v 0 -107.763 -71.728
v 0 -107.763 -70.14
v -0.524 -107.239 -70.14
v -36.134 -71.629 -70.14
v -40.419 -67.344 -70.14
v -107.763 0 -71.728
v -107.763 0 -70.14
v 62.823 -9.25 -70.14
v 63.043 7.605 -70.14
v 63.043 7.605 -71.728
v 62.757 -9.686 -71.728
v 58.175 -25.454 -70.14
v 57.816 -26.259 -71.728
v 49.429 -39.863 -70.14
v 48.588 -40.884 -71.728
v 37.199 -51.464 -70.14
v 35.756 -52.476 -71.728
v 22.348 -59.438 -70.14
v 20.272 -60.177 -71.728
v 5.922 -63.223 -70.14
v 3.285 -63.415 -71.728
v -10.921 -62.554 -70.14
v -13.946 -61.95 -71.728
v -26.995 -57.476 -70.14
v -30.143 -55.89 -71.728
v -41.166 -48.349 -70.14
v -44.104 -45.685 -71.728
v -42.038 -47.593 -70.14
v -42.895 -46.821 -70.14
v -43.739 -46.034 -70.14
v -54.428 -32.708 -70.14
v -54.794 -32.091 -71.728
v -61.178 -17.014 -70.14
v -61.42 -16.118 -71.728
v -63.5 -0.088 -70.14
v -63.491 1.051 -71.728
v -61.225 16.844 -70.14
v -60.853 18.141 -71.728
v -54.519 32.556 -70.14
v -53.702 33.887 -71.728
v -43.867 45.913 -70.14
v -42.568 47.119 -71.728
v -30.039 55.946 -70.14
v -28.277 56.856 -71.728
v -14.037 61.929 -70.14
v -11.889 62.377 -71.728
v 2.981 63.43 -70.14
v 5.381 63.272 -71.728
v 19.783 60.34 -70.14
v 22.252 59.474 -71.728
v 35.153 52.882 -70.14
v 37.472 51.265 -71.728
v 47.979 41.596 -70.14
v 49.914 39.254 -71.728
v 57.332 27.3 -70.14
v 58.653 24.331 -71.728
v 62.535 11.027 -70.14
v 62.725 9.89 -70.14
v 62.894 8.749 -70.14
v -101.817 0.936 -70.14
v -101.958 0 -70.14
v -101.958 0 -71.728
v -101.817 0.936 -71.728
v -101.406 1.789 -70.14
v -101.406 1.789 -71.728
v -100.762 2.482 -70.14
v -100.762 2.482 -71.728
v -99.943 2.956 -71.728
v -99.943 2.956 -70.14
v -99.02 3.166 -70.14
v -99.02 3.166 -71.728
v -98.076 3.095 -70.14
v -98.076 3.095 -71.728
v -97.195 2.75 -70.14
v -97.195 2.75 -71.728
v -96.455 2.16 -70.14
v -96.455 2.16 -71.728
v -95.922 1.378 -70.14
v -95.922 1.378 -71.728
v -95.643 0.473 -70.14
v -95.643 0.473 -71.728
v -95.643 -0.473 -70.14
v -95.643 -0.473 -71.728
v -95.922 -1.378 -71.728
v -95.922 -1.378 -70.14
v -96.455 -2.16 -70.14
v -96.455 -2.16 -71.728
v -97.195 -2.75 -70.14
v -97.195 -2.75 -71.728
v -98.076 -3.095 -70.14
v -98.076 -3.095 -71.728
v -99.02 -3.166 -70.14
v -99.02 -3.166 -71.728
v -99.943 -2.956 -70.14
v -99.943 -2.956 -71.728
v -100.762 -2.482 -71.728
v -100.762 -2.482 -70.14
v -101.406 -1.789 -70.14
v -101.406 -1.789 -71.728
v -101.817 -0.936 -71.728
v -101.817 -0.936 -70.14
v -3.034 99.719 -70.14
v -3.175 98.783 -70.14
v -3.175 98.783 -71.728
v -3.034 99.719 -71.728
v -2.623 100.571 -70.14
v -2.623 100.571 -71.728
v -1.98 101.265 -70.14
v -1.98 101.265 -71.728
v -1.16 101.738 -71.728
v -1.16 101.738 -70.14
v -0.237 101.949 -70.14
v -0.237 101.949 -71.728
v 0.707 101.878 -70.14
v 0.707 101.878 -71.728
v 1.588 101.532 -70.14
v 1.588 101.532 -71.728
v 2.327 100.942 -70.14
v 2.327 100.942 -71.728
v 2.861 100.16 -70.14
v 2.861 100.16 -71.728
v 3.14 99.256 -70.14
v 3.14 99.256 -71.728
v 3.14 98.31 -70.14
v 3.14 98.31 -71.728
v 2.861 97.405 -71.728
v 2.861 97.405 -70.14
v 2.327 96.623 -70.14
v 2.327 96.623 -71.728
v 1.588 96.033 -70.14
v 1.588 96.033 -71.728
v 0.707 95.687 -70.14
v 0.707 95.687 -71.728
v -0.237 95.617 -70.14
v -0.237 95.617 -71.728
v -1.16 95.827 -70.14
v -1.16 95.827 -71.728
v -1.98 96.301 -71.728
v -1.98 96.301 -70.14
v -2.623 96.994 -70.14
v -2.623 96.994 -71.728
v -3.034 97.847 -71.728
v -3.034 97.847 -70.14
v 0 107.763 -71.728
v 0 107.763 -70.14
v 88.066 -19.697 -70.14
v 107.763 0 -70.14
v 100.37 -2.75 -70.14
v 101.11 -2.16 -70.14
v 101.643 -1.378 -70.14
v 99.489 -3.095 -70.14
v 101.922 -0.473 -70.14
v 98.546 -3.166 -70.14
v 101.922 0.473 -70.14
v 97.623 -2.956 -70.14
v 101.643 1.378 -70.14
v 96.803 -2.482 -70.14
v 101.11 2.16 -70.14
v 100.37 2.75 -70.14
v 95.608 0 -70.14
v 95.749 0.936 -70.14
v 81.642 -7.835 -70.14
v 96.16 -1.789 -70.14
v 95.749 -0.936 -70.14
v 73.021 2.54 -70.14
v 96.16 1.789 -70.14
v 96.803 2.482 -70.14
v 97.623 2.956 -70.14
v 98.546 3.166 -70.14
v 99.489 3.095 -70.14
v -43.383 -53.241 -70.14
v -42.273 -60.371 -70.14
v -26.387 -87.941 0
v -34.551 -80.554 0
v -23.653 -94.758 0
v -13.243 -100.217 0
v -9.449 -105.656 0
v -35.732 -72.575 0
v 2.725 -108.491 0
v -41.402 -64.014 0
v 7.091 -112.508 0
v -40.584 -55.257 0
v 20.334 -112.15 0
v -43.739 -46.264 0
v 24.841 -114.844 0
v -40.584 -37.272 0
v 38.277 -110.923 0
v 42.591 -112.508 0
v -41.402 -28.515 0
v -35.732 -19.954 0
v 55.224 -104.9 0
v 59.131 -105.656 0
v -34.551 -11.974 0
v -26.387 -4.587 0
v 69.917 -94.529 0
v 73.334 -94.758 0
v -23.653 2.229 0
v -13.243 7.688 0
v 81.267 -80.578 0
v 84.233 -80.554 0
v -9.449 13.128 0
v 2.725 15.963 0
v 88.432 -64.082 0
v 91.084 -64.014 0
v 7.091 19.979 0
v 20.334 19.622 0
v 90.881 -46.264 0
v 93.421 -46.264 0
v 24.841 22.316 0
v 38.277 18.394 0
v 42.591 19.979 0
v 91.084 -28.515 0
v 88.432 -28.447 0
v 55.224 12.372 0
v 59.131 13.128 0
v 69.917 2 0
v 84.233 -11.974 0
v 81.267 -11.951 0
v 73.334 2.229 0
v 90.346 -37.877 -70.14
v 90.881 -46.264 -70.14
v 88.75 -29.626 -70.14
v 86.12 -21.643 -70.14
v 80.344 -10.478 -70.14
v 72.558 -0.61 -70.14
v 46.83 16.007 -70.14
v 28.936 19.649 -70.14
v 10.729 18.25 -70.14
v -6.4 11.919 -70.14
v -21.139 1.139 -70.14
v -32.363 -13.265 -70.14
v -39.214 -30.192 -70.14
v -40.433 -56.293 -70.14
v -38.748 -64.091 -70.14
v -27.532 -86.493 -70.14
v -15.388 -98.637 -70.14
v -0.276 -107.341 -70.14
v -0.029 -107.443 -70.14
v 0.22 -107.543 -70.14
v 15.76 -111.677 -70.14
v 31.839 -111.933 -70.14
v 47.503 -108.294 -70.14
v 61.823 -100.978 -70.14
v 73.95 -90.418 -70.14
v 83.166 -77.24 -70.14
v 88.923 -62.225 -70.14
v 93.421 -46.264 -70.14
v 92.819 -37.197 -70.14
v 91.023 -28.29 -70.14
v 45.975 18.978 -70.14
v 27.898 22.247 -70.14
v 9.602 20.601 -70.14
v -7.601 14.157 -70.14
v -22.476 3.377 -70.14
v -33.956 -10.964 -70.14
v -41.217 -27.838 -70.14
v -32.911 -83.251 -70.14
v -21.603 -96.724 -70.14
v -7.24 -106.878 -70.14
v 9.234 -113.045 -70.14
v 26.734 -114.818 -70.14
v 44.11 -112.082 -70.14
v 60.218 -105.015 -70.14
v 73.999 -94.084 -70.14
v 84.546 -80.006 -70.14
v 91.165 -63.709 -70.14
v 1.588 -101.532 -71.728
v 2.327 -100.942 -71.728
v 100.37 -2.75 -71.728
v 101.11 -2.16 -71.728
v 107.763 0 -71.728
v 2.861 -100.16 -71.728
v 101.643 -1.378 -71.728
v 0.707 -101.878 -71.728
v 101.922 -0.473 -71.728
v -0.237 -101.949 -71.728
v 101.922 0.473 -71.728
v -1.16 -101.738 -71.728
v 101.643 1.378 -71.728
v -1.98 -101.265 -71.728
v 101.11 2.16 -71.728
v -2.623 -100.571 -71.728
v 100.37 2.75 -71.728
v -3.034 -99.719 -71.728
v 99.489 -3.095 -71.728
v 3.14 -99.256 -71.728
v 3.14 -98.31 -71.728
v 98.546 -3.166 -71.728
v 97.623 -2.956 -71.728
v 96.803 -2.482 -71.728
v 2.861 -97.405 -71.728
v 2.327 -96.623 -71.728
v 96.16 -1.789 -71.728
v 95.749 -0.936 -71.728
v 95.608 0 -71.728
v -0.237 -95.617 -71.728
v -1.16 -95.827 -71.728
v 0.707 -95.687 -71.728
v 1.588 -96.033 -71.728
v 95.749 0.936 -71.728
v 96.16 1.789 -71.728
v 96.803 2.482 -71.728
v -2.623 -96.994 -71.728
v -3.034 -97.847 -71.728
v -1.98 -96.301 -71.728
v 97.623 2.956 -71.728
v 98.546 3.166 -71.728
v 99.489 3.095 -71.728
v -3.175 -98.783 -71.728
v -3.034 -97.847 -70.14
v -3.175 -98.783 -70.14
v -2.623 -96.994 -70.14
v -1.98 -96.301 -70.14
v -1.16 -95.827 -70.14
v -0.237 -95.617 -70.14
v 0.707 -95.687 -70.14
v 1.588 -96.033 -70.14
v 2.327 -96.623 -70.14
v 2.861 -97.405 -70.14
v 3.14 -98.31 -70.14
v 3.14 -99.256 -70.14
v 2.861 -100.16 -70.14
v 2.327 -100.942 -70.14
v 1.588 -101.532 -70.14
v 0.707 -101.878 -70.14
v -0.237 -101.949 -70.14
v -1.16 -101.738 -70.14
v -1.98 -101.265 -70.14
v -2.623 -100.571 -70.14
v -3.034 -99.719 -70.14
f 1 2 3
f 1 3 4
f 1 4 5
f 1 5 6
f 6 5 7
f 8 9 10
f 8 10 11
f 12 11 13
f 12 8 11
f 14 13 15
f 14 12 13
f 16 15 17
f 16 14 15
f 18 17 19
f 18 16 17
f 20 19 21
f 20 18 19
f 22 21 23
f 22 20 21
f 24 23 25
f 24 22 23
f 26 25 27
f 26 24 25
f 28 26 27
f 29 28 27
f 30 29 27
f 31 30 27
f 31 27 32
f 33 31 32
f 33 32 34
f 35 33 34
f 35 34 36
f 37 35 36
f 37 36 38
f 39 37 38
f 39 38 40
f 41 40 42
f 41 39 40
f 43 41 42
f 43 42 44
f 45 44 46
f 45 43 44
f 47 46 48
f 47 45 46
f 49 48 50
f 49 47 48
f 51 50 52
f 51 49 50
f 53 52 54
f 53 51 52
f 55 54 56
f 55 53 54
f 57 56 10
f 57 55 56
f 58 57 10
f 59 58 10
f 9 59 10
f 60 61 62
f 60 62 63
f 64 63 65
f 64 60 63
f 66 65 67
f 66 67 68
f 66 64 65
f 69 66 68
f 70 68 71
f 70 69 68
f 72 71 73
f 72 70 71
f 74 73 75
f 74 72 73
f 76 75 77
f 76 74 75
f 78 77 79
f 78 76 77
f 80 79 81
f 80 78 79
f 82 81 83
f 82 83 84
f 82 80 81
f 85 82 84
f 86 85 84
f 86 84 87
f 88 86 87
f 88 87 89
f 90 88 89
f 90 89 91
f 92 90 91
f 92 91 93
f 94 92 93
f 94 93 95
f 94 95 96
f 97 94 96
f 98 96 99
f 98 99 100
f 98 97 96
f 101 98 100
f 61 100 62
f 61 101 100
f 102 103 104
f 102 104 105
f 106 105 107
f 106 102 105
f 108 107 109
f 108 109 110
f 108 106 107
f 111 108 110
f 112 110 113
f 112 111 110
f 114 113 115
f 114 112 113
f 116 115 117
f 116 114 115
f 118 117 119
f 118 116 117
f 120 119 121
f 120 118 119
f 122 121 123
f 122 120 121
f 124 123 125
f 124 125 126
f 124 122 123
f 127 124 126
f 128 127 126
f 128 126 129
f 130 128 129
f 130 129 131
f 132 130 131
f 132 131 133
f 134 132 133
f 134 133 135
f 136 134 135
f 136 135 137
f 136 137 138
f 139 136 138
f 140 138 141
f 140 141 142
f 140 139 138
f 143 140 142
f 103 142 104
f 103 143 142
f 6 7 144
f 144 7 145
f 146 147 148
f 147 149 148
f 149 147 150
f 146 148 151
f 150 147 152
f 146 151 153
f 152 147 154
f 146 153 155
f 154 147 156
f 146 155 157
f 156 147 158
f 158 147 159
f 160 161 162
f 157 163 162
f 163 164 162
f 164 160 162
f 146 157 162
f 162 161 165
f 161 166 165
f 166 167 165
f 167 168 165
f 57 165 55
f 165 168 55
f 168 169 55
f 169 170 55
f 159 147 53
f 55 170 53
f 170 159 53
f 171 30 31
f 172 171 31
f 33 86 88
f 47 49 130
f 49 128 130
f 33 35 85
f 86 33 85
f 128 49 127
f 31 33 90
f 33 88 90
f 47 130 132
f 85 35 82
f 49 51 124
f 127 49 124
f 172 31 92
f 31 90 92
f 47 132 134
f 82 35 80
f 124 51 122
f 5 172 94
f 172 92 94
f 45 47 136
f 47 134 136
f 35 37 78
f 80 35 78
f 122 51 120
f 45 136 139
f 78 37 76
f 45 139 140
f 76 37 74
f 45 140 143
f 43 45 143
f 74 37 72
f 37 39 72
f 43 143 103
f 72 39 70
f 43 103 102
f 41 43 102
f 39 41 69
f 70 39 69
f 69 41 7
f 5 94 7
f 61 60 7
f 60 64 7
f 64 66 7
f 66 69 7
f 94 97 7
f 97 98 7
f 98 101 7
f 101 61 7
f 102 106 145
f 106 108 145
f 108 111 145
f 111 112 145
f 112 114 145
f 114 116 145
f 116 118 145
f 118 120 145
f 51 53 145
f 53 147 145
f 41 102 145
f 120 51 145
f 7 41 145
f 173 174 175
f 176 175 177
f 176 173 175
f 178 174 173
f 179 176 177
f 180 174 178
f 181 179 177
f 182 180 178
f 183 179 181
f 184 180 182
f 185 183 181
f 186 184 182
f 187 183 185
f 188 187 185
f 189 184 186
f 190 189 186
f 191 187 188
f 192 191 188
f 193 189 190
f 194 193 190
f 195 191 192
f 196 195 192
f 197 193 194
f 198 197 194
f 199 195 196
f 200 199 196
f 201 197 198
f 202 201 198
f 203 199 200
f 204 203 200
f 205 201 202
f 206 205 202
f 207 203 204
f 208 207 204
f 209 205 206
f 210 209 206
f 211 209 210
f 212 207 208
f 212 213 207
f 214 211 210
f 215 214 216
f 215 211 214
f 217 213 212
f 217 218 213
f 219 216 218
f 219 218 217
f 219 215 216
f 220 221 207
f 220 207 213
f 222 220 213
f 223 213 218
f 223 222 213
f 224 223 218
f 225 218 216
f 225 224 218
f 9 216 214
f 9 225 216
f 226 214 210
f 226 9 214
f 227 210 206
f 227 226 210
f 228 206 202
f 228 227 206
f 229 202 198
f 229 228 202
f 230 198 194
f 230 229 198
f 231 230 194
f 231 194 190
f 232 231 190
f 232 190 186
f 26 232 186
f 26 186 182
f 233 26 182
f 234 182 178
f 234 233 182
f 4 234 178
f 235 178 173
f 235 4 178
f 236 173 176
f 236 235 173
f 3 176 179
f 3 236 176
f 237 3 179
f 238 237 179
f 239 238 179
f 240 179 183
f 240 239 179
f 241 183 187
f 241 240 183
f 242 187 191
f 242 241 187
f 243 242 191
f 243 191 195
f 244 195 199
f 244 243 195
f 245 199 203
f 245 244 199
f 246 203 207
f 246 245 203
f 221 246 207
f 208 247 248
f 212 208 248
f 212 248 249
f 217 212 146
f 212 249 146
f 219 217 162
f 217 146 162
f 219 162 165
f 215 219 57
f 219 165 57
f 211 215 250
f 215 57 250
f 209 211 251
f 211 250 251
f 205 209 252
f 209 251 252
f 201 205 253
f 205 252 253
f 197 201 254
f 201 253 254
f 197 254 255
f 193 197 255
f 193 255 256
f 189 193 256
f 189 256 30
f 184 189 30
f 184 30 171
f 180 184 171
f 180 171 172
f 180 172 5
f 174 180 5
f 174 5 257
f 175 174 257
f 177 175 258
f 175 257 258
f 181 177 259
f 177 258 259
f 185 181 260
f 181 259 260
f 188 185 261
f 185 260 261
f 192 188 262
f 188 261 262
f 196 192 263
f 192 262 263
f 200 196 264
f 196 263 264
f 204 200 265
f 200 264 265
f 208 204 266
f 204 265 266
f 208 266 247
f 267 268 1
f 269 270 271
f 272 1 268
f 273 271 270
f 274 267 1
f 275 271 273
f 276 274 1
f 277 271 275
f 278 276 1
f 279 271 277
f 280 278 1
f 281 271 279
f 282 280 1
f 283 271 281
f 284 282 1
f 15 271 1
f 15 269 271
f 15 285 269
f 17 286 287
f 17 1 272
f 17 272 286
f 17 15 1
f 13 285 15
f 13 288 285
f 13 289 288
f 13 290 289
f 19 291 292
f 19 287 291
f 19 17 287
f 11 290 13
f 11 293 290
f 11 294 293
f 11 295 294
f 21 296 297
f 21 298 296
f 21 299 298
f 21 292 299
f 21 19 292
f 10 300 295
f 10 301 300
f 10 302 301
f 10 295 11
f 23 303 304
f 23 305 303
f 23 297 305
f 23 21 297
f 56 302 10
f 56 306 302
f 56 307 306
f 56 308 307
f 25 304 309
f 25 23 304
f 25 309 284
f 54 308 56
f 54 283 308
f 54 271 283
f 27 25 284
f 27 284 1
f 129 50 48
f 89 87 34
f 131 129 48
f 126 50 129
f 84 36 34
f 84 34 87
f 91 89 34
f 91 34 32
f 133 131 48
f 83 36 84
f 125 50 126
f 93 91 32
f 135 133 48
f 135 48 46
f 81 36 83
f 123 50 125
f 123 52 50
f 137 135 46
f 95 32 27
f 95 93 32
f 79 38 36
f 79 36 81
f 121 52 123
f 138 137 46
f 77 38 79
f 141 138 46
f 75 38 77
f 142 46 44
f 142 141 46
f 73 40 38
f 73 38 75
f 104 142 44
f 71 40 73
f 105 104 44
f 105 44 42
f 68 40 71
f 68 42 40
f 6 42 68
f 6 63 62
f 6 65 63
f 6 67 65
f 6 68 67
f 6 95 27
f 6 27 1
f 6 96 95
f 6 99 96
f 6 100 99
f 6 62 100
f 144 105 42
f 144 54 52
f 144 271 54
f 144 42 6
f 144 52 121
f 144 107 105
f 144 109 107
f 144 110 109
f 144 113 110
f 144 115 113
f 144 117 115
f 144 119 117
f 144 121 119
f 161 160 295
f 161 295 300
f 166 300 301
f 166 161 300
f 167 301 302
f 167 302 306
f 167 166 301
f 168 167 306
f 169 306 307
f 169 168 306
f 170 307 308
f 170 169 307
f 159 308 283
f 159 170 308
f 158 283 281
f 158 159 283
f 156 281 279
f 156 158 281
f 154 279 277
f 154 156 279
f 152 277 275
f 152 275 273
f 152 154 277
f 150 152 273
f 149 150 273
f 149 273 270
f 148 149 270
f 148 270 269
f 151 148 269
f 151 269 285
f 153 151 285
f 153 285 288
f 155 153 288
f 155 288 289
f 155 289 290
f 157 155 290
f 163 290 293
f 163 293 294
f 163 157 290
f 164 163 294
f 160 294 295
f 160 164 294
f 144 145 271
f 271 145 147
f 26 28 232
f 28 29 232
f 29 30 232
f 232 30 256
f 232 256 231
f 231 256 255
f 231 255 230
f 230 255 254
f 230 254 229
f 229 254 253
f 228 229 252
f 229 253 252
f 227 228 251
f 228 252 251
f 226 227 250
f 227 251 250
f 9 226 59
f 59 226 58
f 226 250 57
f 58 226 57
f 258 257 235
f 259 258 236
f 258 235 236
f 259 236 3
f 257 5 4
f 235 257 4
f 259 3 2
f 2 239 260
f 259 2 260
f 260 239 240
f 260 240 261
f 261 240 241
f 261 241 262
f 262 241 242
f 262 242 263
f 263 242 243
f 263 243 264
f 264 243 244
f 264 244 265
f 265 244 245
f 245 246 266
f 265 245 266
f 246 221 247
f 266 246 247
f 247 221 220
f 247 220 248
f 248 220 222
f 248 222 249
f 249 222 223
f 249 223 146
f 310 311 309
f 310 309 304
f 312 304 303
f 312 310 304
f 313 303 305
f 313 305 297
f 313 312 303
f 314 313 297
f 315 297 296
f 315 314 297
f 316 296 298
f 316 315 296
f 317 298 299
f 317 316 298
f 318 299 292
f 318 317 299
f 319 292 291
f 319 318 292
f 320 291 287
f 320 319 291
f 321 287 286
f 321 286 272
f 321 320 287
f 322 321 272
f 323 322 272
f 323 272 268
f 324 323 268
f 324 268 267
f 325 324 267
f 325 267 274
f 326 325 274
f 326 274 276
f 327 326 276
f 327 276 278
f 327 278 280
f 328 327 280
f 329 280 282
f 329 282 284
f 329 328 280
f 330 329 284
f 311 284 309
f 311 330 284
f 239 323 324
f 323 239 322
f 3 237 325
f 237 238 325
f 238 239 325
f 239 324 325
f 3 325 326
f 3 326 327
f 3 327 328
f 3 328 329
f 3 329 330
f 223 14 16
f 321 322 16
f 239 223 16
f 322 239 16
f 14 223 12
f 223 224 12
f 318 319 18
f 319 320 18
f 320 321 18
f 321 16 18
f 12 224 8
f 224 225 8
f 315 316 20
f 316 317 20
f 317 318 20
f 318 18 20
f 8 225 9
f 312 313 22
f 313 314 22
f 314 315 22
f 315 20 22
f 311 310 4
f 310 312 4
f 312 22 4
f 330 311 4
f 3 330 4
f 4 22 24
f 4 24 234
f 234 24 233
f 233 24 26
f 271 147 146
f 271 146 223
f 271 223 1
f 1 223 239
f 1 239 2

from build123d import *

# Parameters (mm, degrees)
BOSS_EXTRUDE1_START = -70.140187
SKETCH1_R           = 68.58
SKETCH1_R_2         = 66.04
BOSS_EXTRUDE1_DEPTH = 70.140187
SKETCH2_R           = 3.175
SKETCH2_R_2         = 63.5
BOSS_EXTRUDE2_DEPTH = 1.5875


with BuildPart() as part:
    # Sketch1 → Boss-Extrude1 (new body)
    with BuildSketch(Plane.XY.offset(BOSS_EXTRUDE1_START)):
        with Locations((24.840813797, -46.264409372)):
            Circle(SKETCH1_R)
        with Locations((24.840813797, -46.264409372)):
            Circle(SKETCH1_R_2, mode=Mode.SUBTRACT)
    extrude(amount=BOSS_EXTRUDE1_DEPTH)

    # Sketch2 → Boss-Extrude2 (add)
    with BuildSketch(Plane(origin=(0, 0, -70.14018706), x_dir=(-1, 0, 0), z_dir=(0, 0, -1))):
        Polygon((0, -107.763073453), (107.763073453, 0), (0, 107.763073453), (-107.763073453, 0), align=None)
        with Locations((0, 98.782817332)):
            Circle(SKETCH2_R, mode=Mode.SUBTRACT)
        with Locations((98.782817332, 0)):
            Circle(SKETCH2_R, mode=Mode.SUBTRACT)
        with Locations((0, -98.782817332)):
            Circle(SKETCH2_R, mode=Mode.SUBTRACT)
        with Locations((-98.782817332, 0)):
            Circle(SKETCH2_R, mode=Mode.SUBTRACT)
        with Locations(Location((0, 0, 0), (0, 0, 173.121854306))):
            Circle(SKETCH2_R_2, mode=Mode.SUBTRACT)
    extrude(amount=BOSS_EXTRUDE2_DEPTH)


solid = part.part
